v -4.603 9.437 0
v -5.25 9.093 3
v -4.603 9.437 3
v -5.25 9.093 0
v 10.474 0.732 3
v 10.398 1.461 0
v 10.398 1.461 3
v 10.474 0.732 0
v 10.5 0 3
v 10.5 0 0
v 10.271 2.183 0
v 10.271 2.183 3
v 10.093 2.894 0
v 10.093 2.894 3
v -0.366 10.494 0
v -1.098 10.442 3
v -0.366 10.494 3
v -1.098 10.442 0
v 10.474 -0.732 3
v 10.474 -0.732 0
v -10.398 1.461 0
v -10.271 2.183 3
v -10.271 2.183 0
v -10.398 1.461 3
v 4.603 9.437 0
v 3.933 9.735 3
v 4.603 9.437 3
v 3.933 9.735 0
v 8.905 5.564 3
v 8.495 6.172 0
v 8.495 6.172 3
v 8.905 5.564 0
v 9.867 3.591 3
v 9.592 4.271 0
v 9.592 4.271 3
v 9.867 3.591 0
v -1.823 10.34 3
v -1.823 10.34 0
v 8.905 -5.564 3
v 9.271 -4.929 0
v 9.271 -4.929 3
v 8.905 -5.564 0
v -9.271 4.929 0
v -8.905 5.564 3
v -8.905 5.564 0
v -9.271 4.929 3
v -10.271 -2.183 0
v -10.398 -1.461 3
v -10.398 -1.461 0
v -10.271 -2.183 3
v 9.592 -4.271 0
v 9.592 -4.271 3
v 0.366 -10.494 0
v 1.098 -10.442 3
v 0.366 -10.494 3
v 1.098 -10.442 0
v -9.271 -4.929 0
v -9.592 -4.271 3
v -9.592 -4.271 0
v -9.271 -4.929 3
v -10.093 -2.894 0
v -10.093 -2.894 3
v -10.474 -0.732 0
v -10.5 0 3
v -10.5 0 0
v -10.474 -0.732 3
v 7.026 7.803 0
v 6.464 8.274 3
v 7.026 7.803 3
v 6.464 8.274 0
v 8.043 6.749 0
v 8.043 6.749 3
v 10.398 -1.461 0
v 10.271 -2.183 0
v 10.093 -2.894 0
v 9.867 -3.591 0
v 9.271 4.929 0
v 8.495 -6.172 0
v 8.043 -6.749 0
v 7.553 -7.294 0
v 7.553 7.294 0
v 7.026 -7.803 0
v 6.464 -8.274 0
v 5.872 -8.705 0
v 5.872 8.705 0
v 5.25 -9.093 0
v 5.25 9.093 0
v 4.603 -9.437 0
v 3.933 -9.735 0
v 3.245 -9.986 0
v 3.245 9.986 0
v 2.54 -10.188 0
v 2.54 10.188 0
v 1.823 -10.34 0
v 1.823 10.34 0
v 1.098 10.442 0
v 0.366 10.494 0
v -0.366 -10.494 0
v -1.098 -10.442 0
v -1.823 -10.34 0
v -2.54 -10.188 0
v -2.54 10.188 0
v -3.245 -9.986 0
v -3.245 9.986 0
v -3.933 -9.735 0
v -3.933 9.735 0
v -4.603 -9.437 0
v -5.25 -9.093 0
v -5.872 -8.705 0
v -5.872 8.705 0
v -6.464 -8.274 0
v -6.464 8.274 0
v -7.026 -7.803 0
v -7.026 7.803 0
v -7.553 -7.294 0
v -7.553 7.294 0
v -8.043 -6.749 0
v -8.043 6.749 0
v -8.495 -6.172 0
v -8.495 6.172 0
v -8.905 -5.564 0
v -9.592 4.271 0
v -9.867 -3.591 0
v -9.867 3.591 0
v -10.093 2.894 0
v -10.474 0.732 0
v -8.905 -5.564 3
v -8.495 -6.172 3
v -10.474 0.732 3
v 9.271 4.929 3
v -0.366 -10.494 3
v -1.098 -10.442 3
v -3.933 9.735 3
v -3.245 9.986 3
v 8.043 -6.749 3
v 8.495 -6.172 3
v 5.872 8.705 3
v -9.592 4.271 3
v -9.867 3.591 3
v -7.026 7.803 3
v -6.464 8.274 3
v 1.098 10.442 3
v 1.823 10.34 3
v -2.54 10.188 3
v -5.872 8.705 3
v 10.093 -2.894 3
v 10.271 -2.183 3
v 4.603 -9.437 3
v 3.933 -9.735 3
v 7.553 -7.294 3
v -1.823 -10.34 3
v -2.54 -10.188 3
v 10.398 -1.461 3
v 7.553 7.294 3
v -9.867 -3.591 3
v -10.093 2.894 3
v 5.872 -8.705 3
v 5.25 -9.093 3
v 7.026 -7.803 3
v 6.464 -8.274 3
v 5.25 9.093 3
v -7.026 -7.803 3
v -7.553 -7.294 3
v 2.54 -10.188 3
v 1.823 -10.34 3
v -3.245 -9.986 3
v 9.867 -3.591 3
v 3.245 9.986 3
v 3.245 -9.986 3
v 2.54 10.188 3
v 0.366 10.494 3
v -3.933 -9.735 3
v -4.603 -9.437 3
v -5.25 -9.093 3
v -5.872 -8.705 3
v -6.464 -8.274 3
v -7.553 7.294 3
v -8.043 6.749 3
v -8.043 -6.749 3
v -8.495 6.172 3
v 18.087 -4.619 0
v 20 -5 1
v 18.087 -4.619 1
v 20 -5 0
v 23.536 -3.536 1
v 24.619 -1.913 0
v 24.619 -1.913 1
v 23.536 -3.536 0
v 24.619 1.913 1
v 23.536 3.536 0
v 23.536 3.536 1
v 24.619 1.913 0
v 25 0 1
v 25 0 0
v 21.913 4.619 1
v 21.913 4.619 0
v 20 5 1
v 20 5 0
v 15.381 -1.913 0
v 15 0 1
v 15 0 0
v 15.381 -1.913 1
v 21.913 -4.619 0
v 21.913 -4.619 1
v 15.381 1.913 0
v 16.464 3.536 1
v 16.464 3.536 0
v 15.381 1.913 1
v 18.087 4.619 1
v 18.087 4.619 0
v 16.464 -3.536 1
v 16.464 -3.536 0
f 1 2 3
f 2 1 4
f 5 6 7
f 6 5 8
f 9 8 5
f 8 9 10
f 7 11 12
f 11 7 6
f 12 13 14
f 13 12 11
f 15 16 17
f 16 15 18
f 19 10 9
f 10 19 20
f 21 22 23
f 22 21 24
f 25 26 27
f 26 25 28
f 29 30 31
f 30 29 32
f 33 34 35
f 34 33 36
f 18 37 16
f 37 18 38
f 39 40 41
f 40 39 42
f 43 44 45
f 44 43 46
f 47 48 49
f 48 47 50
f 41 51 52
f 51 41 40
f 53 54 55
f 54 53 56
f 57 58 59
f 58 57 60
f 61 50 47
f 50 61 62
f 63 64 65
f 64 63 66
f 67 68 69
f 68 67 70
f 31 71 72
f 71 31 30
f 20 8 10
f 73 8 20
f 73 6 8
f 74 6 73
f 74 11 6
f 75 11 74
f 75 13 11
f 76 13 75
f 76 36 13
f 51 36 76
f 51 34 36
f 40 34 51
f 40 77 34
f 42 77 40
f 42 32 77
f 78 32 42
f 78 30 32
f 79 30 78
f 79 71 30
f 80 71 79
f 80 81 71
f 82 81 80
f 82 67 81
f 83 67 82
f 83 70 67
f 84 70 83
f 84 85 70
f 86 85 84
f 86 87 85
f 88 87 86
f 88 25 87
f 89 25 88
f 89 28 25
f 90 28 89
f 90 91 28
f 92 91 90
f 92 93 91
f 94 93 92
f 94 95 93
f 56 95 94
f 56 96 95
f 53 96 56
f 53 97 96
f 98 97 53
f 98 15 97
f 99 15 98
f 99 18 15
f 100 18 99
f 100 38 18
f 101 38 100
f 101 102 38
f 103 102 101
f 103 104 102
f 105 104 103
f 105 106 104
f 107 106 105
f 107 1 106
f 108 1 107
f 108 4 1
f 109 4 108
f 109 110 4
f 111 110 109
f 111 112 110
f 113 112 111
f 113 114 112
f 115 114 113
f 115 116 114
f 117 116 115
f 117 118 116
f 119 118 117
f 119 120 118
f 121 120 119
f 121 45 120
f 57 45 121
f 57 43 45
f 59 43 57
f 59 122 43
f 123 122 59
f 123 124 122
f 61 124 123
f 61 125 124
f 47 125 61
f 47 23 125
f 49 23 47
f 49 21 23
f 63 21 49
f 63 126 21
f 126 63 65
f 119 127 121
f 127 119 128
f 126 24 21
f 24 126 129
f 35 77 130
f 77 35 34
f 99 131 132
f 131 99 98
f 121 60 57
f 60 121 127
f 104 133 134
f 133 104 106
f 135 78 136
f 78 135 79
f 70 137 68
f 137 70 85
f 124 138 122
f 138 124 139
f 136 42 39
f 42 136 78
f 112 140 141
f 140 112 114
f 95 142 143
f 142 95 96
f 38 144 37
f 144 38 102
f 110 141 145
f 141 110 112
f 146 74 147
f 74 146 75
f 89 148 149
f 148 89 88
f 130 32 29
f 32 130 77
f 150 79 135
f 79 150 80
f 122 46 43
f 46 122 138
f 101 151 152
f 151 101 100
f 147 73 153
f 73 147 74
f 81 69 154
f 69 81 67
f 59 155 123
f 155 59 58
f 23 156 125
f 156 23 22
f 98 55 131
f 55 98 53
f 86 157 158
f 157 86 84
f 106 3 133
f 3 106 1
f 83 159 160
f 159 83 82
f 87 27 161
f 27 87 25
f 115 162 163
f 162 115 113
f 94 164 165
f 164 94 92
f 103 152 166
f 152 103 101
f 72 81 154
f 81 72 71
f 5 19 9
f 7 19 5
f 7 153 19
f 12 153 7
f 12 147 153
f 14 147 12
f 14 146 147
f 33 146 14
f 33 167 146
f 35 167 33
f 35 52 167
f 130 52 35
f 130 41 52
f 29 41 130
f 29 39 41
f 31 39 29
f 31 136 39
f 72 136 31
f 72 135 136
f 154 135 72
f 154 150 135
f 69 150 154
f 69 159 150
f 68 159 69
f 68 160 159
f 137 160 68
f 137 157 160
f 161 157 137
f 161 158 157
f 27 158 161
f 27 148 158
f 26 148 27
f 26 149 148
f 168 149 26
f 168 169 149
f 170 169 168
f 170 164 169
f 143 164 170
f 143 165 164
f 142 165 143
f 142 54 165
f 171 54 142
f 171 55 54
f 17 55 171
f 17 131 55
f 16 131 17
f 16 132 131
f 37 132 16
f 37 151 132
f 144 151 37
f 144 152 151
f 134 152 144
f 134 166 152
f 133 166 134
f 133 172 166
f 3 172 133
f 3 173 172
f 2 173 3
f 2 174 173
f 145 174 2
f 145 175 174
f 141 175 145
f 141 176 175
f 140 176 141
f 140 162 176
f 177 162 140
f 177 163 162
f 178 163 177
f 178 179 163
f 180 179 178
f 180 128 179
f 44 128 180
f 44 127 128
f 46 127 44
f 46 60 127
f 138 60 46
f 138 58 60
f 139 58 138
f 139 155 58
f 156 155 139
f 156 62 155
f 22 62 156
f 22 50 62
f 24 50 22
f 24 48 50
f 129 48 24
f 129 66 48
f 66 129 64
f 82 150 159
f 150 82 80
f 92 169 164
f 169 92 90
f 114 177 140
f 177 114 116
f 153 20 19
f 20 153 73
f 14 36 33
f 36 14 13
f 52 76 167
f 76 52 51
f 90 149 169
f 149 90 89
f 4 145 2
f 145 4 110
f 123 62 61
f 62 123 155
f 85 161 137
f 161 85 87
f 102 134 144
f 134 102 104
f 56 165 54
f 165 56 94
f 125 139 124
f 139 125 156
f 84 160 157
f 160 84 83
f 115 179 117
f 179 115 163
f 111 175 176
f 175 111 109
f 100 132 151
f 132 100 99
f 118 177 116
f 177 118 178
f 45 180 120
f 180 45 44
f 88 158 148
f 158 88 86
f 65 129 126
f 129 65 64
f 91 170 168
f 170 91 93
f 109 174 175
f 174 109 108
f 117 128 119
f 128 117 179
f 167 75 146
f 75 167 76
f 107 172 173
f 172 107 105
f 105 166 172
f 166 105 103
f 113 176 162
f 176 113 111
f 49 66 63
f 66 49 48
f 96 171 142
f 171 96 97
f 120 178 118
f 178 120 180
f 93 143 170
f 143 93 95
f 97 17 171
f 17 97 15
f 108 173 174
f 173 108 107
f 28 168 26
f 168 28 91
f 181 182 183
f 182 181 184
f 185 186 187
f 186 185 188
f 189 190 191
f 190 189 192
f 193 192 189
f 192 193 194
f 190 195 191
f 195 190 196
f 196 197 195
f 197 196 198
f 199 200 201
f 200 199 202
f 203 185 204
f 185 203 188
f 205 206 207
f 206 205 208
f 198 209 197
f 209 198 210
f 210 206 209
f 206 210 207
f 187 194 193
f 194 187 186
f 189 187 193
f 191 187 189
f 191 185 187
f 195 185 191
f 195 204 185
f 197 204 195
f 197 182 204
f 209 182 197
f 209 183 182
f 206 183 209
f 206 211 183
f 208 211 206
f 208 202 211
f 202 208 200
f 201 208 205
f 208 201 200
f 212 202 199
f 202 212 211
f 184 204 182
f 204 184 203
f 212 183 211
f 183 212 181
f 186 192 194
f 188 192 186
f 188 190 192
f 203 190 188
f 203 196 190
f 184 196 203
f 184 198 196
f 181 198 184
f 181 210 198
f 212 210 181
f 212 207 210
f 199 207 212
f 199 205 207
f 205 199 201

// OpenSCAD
radius = 21 / 2.0;

cylinder(r = radius, h = 3, $fn = 90);

translate([20,0,0])
color("green")
cylinder(r = 5);
